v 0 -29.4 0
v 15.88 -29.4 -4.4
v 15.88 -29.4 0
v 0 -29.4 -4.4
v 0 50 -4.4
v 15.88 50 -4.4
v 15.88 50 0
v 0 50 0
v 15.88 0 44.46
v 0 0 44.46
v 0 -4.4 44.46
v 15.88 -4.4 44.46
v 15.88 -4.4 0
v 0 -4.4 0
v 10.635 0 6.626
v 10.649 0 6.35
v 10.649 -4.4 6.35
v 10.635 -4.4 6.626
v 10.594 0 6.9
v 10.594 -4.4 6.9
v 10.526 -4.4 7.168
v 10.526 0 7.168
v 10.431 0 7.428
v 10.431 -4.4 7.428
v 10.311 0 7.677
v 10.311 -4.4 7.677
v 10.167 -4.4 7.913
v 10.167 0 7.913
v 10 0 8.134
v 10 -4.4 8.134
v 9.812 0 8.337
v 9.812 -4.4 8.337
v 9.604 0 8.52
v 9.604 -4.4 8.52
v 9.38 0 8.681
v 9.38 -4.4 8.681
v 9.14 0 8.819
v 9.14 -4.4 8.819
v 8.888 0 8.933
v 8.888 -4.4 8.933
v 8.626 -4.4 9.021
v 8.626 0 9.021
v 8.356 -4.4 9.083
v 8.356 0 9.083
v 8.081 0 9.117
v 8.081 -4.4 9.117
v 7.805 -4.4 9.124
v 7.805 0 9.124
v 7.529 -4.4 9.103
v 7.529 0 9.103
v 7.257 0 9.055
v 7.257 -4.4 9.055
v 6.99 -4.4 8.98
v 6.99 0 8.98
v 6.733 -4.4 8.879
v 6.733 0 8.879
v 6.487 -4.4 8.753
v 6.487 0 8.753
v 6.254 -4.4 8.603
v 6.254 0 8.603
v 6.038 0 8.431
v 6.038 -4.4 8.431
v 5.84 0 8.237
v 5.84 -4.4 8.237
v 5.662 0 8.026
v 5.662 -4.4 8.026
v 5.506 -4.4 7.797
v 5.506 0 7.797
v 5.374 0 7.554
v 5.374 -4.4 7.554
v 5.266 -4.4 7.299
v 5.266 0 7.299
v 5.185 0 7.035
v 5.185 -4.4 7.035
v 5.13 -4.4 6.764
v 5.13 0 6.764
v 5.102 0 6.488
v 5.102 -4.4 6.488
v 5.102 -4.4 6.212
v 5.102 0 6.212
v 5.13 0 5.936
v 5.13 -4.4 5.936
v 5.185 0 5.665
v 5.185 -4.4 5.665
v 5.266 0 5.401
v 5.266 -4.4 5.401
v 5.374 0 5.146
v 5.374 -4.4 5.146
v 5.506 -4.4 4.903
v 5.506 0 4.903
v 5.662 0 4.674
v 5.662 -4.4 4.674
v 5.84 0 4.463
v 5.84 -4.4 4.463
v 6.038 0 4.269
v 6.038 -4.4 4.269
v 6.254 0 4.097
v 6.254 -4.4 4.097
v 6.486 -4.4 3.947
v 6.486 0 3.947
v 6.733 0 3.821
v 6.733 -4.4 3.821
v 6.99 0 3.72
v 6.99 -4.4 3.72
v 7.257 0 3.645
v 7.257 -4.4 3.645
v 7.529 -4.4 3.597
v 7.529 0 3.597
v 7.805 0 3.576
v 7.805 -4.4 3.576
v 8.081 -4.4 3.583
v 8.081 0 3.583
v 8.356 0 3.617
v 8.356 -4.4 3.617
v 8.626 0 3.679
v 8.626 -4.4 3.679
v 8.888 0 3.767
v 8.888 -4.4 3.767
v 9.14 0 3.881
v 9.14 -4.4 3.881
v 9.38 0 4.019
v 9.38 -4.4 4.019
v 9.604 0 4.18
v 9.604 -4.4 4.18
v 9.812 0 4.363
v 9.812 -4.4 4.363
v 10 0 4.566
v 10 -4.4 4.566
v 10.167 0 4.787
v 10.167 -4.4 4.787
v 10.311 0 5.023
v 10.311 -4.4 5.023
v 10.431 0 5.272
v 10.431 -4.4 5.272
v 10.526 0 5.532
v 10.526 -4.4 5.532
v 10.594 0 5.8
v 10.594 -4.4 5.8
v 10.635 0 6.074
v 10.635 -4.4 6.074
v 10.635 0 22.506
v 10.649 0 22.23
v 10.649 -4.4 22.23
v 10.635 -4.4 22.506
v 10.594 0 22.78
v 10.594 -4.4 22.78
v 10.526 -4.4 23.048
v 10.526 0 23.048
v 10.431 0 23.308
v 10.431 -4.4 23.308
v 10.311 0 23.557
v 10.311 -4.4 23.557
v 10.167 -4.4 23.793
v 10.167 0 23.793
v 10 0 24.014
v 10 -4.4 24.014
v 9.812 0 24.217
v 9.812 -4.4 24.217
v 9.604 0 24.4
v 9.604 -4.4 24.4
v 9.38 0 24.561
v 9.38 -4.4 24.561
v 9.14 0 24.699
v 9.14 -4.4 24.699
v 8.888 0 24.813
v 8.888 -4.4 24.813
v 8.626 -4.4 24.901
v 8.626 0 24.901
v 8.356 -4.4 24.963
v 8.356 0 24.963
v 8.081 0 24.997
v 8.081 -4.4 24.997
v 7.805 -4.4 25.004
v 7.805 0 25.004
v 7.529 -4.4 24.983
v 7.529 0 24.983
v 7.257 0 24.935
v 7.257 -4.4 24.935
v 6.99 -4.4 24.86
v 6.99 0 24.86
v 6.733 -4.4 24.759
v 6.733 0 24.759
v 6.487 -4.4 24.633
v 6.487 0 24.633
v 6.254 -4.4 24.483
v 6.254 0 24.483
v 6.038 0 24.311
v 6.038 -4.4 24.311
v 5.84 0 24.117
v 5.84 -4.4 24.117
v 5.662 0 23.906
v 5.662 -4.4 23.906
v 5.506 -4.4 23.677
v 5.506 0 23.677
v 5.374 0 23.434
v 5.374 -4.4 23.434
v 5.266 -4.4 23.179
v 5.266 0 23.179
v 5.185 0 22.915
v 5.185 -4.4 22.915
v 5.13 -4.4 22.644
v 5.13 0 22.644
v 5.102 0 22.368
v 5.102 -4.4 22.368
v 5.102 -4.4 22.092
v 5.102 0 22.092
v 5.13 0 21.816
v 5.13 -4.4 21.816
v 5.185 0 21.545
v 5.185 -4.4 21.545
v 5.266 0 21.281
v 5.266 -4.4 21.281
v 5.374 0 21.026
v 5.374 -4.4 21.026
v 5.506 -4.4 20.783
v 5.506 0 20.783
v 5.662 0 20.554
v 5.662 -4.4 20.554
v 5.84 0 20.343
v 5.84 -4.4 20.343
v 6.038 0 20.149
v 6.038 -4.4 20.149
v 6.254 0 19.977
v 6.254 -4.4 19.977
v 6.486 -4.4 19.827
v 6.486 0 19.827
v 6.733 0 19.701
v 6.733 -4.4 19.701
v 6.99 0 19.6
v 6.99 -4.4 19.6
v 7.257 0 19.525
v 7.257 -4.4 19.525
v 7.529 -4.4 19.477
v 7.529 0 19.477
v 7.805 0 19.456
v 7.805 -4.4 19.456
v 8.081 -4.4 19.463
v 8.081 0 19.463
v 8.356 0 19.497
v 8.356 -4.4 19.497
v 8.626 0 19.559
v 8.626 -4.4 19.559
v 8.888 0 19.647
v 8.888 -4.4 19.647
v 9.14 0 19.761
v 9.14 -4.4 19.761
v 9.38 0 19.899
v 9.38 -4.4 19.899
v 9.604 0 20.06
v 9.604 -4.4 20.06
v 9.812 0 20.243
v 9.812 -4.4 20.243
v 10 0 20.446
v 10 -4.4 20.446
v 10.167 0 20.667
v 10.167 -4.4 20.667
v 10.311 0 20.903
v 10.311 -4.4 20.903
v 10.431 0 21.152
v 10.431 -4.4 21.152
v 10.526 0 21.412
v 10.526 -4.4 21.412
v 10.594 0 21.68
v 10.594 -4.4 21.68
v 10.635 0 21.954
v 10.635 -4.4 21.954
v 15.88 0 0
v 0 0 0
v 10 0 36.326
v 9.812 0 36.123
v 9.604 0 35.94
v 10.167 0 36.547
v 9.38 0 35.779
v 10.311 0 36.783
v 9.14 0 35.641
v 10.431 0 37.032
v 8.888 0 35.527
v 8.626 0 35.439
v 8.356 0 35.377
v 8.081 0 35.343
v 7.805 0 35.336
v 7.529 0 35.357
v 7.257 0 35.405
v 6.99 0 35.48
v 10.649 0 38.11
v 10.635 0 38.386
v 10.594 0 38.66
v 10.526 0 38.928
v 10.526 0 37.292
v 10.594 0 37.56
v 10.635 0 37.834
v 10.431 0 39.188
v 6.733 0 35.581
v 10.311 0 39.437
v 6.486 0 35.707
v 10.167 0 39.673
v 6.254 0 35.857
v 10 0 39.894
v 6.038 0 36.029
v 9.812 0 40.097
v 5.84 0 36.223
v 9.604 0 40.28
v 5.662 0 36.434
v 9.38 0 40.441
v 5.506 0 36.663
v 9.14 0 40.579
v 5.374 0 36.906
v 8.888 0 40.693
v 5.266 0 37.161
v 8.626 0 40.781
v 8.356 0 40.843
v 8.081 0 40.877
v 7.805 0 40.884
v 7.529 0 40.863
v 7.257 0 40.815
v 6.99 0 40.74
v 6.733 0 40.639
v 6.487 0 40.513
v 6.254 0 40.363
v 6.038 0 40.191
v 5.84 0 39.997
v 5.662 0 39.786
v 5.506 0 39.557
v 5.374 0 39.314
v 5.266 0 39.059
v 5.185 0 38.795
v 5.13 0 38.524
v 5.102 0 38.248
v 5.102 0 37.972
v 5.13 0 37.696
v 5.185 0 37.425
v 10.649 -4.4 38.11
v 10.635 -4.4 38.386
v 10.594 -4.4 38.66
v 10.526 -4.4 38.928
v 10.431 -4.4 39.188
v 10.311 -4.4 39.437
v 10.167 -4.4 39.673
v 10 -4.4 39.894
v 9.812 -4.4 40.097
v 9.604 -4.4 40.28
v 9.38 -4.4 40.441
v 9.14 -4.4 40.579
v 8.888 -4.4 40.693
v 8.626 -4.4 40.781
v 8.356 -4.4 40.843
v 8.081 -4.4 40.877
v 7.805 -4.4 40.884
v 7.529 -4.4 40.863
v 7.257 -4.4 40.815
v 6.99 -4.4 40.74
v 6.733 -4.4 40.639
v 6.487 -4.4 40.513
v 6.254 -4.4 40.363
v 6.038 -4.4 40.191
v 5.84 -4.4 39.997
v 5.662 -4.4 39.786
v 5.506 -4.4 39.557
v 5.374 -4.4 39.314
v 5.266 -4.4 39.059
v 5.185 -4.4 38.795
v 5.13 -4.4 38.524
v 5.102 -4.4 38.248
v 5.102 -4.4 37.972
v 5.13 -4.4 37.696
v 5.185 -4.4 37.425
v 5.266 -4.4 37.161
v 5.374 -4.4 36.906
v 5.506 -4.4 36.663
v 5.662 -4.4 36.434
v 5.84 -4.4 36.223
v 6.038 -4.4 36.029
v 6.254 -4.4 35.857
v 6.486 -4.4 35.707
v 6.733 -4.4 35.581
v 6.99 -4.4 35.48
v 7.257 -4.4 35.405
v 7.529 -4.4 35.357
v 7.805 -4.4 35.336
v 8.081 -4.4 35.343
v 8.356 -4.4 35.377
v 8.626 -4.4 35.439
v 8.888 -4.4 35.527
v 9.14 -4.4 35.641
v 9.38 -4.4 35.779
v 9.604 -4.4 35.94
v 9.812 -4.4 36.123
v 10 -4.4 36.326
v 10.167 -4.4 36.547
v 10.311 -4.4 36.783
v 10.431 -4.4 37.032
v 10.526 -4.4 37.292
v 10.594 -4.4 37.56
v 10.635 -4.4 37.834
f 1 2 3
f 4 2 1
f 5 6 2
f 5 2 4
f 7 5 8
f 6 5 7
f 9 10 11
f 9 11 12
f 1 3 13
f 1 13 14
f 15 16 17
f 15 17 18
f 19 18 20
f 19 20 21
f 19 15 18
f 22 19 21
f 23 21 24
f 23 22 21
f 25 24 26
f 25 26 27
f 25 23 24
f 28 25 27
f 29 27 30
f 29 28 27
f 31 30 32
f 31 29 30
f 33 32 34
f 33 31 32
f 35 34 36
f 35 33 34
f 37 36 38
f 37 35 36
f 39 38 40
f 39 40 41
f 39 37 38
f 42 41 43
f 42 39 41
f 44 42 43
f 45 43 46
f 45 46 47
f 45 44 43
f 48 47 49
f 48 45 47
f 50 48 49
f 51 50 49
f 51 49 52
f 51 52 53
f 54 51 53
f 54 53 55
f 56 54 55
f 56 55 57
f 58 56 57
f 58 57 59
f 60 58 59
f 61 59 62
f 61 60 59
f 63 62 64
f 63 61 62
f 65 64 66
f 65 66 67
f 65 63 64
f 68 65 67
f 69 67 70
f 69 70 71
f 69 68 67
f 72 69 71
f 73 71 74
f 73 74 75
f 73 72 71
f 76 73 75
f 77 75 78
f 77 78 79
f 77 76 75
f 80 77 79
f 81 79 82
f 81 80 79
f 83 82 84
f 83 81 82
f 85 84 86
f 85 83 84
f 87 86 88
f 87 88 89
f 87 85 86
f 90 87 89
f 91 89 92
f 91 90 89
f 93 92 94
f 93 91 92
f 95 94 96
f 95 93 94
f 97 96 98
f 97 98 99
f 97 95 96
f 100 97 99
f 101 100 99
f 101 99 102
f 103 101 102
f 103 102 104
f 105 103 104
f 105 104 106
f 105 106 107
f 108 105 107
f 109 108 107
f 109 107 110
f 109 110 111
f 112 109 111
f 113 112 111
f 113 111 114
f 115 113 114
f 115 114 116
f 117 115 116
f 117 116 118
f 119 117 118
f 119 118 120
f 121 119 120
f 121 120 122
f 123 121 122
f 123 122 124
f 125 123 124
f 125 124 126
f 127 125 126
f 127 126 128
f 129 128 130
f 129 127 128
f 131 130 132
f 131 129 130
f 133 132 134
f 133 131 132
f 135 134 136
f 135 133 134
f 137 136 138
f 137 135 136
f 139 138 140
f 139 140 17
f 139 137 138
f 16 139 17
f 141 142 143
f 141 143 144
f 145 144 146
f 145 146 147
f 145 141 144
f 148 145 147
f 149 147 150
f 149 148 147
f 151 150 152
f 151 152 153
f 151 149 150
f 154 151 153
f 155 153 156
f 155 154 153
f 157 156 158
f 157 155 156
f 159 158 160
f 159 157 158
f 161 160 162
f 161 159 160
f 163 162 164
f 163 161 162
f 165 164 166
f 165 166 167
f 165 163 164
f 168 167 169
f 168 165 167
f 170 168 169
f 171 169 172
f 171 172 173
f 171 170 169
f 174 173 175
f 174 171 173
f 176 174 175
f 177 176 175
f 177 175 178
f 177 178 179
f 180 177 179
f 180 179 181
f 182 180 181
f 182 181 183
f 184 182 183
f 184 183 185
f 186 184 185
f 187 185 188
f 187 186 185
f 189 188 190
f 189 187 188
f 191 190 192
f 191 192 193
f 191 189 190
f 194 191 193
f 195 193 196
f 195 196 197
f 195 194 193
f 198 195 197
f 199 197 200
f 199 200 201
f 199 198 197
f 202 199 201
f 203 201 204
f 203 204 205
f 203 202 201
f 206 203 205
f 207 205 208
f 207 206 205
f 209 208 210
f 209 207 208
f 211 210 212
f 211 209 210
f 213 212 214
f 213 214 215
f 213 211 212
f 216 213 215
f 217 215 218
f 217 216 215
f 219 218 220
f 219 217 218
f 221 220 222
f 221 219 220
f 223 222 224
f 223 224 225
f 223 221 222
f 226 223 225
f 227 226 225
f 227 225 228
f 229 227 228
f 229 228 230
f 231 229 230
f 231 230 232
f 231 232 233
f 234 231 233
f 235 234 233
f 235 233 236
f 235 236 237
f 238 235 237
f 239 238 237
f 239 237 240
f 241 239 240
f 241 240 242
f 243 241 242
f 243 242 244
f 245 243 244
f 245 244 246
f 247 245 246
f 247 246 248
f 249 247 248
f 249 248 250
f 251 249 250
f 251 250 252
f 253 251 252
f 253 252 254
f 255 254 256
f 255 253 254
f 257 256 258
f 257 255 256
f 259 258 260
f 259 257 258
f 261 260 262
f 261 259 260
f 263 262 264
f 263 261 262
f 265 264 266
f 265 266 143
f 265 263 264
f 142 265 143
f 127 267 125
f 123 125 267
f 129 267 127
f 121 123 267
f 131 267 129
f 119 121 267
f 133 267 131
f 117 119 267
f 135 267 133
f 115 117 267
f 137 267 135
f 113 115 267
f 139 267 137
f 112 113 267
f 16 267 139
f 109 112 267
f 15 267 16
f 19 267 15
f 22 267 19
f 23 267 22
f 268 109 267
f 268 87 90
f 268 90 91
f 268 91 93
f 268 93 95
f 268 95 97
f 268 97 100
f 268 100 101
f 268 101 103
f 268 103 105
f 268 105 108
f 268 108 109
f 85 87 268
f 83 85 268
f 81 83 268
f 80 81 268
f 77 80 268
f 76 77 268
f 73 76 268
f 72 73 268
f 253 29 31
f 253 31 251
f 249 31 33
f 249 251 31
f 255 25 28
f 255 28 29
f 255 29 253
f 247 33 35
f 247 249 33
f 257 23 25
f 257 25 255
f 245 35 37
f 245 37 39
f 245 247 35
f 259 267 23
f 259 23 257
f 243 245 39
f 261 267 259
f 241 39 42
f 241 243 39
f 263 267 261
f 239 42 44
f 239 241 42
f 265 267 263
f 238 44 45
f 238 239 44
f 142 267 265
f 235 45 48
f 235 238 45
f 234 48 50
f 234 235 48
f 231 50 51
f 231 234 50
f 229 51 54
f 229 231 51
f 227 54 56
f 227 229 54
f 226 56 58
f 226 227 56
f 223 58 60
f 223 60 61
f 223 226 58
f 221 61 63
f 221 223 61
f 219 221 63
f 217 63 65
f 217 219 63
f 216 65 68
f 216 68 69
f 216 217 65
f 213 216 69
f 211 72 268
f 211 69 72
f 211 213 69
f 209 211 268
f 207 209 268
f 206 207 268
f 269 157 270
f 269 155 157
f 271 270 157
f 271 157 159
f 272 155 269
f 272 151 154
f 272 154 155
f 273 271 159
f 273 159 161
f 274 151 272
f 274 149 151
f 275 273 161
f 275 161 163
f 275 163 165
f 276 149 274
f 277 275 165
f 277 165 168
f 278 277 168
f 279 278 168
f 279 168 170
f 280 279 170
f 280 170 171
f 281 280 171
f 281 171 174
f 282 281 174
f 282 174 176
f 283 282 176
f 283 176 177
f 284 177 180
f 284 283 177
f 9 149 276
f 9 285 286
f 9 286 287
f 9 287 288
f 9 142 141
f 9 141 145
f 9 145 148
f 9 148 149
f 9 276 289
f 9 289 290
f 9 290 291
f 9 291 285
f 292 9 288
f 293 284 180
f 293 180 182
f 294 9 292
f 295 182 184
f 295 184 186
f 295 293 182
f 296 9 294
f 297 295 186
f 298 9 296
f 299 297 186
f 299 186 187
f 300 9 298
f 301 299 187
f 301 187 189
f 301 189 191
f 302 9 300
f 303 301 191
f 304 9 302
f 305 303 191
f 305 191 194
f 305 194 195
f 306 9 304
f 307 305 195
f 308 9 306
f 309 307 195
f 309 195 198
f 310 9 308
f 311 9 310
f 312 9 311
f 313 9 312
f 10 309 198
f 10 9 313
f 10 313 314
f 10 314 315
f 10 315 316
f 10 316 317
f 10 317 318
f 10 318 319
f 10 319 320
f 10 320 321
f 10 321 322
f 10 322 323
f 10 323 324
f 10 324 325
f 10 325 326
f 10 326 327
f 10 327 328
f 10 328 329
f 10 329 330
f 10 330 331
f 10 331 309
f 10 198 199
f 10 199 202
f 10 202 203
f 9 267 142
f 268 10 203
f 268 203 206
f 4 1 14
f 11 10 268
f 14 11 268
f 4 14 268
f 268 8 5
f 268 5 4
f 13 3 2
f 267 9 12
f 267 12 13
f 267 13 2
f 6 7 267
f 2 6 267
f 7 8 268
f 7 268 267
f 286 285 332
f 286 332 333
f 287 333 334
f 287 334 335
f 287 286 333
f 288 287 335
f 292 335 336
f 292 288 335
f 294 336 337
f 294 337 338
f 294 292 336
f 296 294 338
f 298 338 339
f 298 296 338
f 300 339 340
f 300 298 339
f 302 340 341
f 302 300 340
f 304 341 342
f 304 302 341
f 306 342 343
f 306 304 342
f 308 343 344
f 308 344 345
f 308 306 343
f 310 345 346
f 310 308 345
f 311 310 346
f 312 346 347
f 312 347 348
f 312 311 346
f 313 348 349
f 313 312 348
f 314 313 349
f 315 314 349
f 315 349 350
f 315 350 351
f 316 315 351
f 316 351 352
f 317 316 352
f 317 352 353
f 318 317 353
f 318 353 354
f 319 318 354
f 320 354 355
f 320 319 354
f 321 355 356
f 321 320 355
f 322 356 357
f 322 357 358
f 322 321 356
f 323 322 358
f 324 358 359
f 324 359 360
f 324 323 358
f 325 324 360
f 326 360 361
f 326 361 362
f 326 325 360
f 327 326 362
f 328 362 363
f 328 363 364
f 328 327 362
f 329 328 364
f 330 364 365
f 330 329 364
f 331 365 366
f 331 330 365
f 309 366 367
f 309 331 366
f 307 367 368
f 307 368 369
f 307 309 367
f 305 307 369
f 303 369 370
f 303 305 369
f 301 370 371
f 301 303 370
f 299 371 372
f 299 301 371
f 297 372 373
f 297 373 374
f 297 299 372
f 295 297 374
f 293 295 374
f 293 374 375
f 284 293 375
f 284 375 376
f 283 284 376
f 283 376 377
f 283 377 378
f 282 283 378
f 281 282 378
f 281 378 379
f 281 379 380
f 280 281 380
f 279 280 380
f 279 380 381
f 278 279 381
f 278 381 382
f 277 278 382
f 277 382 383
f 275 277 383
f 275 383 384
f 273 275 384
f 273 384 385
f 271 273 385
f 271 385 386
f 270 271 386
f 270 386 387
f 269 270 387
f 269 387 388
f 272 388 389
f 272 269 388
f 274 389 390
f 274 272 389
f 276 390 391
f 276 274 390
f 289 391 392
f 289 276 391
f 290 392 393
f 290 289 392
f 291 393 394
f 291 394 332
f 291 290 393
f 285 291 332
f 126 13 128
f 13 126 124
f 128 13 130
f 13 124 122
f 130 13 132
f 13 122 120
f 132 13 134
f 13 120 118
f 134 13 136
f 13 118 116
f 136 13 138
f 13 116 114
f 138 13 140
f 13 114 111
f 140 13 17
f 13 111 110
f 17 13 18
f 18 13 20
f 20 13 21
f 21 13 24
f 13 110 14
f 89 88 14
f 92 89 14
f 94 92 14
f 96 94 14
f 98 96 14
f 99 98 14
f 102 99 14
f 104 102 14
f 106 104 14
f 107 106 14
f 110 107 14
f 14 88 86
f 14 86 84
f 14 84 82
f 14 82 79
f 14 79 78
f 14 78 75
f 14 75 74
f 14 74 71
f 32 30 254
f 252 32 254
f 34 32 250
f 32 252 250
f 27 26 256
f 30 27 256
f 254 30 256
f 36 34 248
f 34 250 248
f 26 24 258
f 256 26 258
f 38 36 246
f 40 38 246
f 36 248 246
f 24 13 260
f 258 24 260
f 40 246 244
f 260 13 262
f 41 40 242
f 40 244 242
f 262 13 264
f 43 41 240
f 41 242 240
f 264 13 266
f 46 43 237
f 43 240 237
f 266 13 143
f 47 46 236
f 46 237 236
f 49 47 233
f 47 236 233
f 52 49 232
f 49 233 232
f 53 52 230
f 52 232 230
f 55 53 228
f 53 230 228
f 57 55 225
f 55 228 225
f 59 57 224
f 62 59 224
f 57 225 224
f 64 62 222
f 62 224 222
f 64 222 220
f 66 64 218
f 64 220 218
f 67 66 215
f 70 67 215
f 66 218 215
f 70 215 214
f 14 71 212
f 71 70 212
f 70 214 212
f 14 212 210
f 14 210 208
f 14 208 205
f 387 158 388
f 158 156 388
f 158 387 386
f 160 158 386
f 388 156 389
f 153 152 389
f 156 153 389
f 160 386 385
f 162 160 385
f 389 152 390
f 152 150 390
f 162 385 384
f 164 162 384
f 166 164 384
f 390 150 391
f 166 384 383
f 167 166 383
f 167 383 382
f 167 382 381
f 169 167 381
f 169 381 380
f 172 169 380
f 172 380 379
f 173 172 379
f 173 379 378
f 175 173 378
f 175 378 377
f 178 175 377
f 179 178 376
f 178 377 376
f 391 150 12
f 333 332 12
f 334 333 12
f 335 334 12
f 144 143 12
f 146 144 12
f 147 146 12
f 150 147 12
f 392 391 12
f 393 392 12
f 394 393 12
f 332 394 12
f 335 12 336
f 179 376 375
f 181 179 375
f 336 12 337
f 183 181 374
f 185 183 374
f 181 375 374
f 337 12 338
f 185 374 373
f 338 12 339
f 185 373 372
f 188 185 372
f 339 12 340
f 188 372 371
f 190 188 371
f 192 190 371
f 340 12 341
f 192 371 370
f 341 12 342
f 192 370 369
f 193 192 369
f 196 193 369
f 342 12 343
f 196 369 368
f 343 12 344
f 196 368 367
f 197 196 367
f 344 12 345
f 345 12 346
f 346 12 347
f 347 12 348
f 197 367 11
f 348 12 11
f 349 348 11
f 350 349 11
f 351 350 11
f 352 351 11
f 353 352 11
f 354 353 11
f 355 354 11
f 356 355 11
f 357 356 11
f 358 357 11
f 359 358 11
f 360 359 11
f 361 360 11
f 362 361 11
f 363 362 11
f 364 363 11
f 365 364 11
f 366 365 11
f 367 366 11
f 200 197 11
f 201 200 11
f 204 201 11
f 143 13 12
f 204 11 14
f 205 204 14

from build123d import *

# Parameters (mm, degrees)
SKETCH_W       = 15.88
SKETCH_H       = 44.46
SKETCH_R       = 2.775
PAD_DEPTH      = 4.4
PAD_FACE1_W    = 4.4
PAD_FACE1_H    = 15.88
PAD001_DEPTH   = 4.4
PAD001_FACE6_W = 15.88
PAD001_FACE6_H = 4.4
PAD002_DEPTH   = 50
PAD002_FACE7_W = 15.88
PAD002_FACE7_H = 4.4
PAD003_DEPTH   = 25


with BuildPart() as part:
    # Sketch → Pad (new body)
    with BuildSketch(Plane.XZ):
        with Locations((7.94, 22.23)):
            Rectangle(SKETCH_W, SKETCH_H)
        with Locations((7.874, 6.35)):
            Circle(SKETCH_R, mode=Mode.SUBTRACT)
        with Locations((7.874, 22.23)):
            Circle(SKETCH_R, mode=Mode.SUBTRACT)
        with Locations((7.874, 38.11)):
            Circle(SKETCH_R, mode=Mode.SUBTRACT)
    extrude(amount=PAD_DEPTH)

    # Pad Face1 → Pad001 (add)
    with BuildSketch(Plane(origin=(7.94, -2.2, 0), x_dir=(0, -1, 0), z_dir=(0, 0, -1))):
        Rectangle(PAD_FACE1_W, PAD_FACE1_H)
    extrude(amount=PAD001_DEPTH)

    # Pad001 Face6 → Pad002 (add)
    with BuildSketch(Plane(origin=(7.94, 0, -2.2), x_dir=(1, 0, 0), z_dir=(0, 1, 0))):
        Rectangle(PAD001_FACE6_W, PAD001_FACE6_H)
    extrude(amount=PAD002_DEPTH)

    # Pad002 Face7 → Pad003 (add)
    with BuildSketch(Plane(origin=(7.94, -4.4, -2.2), x_dir=(-1, 0, 0), z_dir=(0, -1, 0))):
        Rectangle(PAD002_FACE7_W, PAD002_FACE7_H)
    extrude(amount=PAD003_DEPTH)


solid = part.part
